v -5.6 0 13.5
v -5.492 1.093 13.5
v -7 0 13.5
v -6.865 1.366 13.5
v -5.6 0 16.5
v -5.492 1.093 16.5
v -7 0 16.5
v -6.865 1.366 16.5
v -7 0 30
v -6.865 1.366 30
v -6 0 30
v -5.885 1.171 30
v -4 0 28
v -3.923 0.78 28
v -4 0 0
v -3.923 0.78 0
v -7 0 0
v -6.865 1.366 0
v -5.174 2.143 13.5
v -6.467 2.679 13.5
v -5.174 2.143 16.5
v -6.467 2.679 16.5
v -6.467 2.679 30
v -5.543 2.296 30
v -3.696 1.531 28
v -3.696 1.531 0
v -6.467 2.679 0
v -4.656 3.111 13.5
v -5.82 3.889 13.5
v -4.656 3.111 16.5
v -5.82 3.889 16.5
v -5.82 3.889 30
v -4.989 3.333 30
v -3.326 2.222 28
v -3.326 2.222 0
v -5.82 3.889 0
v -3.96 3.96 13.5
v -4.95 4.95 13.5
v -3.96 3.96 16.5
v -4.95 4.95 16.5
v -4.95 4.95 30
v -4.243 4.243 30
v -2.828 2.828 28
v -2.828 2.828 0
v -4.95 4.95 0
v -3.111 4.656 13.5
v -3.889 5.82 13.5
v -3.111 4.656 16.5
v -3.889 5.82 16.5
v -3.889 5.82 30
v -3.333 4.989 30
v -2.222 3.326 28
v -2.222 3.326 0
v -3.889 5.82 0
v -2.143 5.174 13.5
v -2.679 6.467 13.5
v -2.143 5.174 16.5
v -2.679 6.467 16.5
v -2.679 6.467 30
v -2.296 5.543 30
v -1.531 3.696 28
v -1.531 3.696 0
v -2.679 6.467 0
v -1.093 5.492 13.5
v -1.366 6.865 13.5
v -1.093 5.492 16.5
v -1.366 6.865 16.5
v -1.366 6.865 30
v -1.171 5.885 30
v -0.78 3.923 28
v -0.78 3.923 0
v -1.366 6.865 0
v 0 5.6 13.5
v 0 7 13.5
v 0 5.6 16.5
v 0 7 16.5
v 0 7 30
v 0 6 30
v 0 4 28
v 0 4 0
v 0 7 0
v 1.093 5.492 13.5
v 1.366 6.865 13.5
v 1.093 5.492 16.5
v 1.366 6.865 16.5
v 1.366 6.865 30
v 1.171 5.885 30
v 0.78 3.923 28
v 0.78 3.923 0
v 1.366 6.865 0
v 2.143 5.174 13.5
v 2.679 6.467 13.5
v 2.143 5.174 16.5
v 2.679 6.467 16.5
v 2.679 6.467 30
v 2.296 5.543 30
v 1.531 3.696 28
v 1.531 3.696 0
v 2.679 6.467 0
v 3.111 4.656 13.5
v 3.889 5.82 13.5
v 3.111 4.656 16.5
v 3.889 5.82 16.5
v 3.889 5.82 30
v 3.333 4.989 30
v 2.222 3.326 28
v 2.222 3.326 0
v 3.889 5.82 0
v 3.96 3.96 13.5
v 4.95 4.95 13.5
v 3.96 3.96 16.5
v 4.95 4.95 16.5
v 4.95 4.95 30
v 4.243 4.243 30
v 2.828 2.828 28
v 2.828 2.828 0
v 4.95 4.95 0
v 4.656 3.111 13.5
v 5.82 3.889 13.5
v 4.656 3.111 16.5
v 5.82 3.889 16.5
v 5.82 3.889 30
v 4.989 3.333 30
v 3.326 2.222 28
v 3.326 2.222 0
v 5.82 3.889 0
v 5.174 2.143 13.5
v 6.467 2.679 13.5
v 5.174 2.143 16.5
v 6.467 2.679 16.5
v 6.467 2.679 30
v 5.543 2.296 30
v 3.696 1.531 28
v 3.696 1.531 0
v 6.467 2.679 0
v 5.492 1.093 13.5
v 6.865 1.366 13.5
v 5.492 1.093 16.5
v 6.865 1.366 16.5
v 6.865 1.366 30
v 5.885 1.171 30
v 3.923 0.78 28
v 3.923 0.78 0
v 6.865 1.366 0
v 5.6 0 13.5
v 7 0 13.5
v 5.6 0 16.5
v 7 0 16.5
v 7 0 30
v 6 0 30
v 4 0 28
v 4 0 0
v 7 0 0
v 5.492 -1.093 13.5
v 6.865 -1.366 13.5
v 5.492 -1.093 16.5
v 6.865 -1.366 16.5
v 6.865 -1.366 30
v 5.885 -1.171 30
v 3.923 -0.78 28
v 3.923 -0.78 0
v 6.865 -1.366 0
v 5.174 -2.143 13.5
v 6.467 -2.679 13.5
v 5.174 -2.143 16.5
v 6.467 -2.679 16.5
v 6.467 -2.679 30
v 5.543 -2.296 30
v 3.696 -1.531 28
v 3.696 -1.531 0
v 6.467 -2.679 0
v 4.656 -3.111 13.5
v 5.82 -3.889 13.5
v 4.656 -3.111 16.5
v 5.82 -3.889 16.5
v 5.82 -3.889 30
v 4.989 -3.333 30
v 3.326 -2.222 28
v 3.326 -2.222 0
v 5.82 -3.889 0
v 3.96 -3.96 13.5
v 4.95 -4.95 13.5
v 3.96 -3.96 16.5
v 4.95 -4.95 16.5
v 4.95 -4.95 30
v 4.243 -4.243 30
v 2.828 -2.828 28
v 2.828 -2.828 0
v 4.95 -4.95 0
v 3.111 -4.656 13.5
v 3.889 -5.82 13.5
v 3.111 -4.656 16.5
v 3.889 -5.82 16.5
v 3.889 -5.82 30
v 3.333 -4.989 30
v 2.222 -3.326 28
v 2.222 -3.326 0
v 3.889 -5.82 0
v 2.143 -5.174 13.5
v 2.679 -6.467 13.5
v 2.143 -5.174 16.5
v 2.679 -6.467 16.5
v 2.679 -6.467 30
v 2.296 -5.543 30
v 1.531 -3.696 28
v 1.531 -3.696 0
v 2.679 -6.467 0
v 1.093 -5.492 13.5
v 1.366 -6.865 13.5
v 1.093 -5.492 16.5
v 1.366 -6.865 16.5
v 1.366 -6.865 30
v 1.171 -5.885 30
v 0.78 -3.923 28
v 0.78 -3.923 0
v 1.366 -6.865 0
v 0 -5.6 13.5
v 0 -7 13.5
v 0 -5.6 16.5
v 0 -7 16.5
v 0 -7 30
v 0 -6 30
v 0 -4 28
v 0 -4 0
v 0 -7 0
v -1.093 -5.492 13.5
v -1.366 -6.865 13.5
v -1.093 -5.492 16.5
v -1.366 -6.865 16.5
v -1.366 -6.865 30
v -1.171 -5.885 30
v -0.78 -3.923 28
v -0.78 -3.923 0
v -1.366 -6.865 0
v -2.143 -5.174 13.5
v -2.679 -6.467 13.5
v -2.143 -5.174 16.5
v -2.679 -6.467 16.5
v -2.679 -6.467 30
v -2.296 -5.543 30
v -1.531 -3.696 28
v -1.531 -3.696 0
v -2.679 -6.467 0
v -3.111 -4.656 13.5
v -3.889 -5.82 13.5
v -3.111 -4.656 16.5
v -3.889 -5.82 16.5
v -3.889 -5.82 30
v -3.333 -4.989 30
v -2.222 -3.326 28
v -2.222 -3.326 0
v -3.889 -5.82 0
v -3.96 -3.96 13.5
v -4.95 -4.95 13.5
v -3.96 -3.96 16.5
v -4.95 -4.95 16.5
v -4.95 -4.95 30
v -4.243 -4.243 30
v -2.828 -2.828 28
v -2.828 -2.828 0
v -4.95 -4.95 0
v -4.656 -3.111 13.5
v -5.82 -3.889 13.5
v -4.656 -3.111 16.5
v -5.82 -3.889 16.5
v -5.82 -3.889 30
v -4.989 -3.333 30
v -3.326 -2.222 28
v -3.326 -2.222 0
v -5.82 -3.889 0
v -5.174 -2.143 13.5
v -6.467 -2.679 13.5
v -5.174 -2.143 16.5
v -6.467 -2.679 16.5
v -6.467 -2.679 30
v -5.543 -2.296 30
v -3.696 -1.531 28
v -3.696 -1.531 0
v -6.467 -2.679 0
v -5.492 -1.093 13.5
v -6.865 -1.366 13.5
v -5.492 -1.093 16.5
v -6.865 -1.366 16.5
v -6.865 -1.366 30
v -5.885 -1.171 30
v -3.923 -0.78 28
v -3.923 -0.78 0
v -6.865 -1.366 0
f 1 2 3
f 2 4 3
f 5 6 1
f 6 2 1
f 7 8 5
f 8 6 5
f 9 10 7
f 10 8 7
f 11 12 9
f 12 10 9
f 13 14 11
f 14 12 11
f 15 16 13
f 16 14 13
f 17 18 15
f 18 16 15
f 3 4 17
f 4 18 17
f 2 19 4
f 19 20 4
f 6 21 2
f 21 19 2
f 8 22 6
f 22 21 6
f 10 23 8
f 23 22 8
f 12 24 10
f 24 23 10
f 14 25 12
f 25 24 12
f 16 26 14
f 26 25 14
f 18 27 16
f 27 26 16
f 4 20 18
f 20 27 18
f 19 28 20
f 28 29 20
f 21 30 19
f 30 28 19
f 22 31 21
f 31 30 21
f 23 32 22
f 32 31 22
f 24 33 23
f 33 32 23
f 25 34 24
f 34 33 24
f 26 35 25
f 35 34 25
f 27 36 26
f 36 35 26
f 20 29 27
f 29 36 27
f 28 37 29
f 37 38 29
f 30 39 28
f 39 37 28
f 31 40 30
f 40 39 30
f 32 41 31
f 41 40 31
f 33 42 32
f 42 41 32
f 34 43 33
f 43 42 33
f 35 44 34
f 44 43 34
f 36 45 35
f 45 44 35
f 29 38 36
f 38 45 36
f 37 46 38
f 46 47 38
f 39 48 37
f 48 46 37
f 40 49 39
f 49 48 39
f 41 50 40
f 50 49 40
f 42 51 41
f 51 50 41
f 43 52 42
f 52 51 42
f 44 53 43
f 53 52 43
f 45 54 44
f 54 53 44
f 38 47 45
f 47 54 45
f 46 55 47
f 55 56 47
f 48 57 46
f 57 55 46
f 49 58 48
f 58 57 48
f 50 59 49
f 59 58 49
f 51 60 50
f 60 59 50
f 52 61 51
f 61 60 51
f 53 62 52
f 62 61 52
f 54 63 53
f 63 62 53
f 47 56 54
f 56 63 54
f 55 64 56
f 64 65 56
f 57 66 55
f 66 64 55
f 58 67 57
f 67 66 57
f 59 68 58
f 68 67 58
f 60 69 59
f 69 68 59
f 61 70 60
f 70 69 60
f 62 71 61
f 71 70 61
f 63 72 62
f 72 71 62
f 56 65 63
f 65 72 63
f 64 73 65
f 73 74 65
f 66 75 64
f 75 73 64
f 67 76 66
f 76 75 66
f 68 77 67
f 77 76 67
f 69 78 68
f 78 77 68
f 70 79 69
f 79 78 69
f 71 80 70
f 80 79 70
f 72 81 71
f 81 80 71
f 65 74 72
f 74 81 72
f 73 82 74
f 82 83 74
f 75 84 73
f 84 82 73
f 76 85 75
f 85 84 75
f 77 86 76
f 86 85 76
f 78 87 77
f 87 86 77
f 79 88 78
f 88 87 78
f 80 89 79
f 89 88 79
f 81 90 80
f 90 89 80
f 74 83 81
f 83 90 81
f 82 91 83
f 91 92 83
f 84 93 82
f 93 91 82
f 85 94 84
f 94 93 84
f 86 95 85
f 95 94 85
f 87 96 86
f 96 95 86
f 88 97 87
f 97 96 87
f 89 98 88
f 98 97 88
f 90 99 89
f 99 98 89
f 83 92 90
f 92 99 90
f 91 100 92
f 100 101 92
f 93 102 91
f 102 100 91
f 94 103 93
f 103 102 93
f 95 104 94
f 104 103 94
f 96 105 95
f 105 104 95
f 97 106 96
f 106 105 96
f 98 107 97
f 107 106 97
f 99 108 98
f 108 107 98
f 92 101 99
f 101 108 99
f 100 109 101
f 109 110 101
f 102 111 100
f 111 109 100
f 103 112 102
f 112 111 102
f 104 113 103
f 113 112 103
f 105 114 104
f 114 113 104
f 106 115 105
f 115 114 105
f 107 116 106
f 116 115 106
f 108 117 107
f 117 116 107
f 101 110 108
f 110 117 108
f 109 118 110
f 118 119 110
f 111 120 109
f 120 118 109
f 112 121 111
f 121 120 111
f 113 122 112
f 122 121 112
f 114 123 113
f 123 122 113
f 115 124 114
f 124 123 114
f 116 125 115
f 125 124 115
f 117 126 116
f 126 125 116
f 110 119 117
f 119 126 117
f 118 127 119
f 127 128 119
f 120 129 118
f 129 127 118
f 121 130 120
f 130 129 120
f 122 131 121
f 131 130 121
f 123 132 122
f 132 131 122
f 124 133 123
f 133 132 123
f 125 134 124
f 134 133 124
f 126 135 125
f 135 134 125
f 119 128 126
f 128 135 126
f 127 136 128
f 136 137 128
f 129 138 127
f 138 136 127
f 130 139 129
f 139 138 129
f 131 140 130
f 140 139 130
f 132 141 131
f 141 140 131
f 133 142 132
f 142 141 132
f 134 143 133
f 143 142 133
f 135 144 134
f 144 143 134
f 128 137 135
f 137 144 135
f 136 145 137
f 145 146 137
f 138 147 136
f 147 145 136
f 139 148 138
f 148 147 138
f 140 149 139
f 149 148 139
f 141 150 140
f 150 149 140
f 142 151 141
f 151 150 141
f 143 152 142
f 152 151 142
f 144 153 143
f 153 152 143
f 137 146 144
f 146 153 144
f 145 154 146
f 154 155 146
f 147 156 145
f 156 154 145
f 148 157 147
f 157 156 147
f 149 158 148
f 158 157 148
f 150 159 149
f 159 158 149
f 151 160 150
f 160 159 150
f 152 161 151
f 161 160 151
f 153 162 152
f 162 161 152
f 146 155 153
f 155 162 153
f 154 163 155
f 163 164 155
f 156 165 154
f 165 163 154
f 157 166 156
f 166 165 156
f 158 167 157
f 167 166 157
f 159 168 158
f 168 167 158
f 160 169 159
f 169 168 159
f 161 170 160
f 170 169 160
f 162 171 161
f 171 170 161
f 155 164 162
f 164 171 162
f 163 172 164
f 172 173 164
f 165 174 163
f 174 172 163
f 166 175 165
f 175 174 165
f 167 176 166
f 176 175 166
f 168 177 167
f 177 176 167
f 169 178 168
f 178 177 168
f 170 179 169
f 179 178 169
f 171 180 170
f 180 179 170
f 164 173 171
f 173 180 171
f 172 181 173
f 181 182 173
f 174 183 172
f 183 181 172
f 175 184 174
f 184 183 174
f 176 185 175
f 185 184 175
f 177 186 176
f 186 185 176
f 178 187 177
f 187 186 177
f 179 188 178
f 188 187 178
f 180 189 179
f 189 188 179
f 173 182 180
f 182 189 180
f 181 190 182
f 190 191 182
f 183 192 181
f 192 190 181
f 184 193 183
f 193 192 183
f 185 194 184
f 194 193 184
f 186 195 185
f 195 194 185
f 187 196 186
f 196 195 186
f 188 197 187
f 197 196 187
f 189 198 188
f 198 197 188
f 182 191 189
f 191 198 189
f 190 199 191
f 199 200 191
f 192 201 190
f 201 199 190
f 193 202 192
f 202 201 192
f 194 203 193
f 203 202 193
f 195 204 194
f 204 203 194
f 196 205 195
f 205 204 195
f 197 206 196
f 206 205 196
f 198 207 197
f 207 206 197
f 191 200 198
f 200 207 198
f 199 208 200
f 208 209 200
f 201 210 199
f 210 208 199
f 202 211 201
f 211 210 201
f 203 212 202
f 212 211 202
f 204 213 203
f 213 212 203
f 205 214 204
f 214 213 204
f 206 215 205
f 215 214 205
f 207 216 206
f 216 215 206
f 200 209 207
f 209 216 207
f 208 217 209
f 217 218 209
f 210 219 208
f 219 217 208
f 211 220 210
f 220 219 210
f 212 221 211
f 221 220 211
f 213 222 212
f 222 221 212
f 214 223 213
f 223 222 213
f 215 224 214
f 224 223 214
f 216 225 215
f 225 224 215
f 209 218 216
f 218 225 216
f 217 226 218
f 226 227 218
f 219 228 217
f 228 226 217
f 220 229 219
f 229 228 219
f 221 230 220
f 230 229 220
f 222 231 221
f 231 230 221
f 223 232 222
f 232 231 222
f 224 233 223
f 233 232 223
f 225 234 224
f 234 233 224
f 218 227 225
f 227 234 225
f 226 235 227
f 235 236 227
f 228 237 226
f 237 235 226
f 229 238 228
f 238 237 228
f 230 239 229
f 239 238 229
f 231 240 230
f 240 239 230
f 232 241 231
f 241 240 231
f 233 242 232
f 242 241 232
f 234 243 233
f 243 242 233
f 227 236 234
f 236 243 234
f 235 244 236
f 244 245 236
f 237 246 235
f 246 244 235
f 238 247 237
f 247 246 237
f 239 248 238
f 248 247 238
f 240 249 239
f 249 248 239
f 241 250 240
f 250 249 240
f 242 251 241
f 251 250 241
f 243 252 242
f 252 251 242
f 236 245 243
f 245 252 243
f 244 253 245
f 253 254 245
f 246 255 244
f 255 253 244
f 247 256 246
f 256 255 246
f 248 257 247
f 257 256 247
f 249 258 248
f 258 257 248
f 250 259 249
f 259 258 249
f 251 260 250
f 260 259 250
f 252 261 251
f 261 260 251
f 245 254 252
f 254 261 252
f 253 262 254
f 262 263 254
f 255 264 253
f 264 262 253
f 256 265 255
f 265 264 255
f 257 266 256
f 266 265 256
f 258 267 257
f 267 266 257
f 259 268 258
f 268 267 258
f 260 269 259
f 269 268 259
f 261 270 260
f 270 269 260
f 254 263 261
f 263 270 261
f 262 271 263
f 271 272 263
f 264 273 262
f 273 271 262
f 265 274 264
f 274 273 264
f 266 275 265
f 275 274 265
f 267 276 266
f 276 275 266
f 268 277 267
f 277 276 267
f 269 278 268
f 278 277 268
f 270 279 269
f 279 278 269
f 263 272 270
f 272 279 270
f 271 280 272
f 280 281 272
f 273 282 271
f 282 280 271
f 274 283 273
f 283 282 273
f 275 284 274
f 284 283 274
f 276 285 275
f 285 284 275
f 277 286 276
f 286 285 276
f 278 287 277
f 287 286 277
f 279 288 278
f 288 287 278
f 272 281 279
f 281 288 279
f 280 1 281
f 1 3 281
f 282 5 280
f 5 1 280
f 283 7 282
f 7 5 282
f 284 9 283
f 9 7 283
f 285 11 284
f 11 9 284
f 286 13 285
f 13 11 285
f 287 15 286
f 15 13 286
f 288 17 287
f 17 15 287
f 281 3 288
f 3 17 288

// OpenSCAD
$fn = 32;

// ----------------------------------------------------------------------
// Grooved revolve: thread_relief, bore R4
// ----------------------------------------------------------------------

// --- parameters (mm) ---
bore_r = 4;               // bore radius
outer_r = 7;              // outer radius of the body
total_h = 30;             // overall height, Z
wall = 3;                 // radial wall thickness
groove_w = 3;             // groove width
groove_d = 1.4;           // groove depth
grooves = 1;              // number of outer grooves
relief = 2;               // thread relief leg at the bore mouth
relief_angle = 45;        // thread relief chamfer angle, degrees

bbox_x = 2 * outer_r;  // full diameter
bore_d = 2 * bore_r;  // bore diameter
body_d = 2 * outer_r;  // body diameter
revolve_angle = 360;  // full turn around the Z axis

profile = [[4, 0], [7, 0], [7, 13.5], [5.6, 13.5], [5.6, 16.5], [7, 16.5], [7, 30], [6, 30], [4, 28]];  // primary outline, 9 points, counter clockwise

// --- the one profile operation ---
rotate_extrude(angle = revolve_angle) polygon(points = profile);
